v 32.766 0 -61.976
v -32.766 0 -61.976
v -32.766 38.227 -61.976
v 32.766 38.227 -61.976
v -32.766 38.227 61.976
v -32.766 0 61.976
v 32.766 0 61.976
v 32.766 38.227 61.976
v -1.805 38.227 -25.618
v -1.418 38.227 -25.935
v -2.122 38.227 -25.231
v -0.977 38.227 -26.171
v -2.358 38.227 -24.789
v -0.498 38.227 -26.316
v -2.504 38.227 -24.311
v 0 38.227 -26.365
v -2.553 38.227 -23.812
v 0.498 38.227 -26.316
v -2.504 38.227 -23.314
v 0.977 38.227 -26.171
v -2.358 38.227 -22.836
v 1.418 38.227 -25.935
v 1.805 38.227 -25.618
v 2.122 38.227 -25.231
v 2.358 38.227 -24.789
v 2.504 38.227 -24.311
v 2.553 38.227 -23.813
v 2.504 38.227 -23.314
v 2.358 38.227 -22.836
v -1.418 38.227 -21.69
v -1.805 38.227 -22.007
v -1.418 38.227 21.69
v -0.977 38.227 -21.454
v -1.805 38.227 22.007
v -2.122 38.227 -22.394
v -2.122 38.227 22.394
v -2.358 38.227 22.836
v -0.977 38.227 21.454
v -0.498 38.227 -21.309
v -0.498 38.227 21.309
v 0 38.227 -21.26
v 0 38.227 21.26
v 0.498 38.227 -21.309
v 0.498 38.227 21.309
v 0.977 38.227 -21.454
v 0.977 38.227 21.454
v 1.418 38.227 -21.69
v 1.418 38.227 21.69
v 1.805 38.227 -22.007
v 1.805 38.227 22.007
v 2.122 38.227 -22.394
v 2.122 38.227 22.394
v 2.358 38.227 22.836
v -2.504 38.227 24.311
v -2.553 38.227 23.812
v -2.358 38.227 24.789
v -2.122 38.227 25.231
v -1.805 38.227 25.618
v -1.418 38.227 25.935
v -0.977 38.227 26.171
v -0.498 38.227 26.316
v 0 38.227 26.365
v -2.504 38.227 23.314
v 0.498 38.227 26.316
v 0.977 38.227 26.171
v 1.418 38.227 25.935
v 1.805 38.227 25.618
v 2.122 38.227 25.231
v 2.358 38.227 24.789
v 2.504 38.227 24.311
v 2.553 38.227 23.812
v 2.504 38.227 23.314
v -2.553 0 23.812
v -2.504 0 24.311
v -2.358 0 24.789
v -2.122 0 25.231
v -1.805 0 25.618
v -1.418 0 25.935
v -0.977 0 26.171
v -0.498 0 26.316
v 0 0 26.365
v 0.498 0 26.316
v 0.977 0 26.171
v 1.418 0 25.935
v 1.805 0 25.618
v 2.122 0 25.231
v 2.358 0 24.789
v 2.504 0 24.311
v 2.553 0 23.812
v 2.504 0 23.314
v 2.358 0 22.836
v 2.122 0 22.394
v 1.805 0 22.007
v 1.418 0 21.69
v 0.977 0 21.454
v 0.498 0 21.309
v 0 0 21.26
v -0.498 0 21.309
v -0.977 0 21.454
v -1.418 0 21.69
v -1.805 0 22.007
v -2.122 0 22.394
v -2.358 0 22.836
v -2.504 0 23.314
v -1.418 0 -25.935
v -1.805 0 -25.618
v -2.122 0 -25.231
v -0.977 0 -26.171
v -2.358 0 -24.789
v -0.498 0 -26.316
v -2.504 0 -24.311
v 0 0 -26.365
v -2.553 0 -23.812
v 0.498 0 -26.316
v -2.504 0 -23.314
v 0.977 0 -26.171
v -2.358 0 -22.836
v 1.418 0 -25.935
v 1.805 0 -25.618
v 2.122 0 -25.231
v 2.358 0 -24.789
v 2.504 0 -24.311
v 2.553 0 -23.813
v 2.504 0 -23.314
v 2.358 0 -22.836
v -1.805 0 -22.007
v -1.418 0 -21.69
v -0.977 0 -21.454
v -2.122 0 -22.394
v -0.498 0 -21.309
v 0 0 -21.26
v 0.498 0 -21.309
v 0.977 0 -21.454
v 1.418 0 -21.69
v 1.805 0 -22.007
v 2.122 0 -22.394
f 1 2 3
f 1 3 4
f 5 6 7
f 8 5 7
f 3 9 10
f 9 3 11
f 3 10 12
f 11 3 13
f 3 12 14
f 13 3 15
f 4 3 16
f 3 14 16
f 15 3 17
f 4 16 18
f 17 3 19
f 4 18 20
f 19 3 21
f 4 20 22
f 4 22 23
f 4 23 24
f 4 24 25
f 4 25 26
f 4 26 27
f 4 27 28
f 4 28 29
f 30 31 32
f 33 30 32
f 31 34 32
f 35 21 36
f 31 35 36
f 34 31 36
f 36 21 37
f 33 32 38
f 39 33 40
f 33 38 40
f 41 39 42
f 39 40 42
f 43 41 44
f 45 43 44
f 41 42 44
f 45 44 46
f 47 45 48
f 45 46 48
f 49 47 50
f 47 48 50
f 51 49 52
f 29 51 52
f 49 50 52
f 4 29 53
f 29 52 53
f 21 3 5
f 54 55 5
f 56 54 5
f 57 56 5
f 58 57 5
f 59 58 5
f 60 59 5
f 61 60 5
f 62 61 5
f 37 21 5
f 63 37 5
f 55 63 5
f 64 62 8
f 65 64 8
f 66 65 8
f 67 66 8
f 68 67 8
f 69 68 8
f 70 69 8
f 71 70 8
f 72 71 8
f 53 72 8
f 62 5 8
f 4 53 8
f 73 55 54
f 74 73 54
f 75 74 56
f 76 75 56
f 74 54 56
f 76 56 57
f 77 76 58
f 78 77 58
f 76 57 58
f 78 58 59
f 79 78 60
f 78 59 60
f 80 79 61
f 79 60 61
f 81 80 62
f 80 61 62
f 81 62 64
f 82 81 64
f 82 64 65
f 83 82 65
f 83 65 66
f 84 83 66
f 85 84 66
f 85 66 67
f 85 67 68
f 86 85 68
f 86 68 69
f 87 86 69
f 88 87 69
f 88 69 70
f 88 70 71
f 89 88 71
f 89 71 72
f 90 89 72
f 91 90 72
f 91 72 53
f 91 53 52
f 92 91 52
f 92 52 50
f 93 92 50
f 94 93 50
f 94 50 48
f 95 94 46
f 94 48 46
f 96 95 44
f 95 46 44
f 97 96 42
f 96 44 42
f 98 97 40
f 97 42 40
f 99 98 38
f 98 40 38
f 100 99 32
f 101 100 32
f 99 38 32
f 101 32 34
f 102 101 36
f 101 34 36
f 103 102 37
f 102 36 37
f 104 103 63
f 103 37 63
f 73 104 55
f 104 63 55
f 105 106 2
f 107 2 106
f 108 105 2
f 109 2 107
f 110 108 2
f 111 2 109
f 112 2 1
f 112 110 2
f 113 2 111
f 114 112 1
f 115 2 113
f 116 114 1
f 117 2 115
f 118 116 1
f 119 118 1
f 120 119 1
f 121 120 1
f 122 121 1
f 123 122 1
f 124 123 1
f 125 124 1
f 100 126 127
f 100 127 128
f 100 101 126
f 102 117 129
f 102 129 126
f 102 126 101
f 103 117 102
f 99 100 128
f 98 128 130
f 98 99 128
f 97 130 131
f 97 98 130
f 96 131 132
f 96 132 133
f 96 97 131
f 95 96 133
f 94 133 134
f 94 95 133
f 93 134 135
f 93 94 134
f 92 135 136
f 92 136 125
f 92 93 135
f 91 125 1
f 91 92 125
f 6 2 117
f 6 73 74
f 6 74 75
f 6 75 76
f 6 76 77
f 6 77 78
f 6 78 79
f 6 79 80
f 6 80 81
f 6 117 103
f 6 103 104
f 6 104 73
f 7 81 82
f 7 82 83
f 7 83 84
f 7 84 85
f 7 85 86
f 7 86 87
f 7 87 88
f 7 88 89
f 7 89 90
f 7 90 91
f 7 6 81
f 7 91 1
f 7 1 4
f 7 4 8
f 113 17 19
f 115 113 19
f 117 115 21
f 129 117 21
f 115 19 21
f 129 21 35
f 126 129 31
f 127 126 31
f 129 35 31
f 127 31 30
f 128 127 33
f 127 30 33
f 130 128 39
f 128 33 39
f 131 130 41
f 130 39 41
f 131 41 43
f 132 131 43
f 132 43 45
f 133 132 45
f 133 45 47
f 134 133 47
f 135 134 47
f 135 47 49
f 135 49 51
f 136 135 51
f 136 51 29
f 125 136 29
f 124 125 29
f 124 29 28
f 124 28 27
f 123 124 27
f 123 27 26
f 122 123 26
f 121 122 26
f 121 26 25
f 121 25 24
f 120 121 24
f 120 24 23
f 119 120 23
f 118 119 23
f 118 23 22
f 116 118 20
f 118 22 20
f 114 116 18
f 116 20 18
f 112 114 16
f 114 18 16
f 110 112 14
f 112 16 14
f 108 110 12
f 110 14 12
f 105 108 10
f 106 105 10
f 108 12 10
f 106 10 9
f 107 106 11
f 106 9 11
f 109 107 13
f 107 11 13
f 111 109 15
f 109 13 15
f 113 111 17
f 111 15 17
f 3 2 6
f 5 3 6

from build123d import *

# Parameters (mm, degrees)
F0_W     = 65.532
F0_H     = 123.952
F1_DEPTH = 38.227
F3_D     = 5.1054


with BuildPart() as f1:
    # F0 (on Front) → F1 (new body)
    with BuildSketch(Plane.XZ):
        Rectangle(F0_W, F0_H)
    extrude(amount=-F1_DEPTH)

    # F3 (through all)
    with Locations(Plane.XZ):
        with Locations((0, 23.8125), (0, -23.8125)):
            Hole(F3_D / 2)


solid = f1.part
